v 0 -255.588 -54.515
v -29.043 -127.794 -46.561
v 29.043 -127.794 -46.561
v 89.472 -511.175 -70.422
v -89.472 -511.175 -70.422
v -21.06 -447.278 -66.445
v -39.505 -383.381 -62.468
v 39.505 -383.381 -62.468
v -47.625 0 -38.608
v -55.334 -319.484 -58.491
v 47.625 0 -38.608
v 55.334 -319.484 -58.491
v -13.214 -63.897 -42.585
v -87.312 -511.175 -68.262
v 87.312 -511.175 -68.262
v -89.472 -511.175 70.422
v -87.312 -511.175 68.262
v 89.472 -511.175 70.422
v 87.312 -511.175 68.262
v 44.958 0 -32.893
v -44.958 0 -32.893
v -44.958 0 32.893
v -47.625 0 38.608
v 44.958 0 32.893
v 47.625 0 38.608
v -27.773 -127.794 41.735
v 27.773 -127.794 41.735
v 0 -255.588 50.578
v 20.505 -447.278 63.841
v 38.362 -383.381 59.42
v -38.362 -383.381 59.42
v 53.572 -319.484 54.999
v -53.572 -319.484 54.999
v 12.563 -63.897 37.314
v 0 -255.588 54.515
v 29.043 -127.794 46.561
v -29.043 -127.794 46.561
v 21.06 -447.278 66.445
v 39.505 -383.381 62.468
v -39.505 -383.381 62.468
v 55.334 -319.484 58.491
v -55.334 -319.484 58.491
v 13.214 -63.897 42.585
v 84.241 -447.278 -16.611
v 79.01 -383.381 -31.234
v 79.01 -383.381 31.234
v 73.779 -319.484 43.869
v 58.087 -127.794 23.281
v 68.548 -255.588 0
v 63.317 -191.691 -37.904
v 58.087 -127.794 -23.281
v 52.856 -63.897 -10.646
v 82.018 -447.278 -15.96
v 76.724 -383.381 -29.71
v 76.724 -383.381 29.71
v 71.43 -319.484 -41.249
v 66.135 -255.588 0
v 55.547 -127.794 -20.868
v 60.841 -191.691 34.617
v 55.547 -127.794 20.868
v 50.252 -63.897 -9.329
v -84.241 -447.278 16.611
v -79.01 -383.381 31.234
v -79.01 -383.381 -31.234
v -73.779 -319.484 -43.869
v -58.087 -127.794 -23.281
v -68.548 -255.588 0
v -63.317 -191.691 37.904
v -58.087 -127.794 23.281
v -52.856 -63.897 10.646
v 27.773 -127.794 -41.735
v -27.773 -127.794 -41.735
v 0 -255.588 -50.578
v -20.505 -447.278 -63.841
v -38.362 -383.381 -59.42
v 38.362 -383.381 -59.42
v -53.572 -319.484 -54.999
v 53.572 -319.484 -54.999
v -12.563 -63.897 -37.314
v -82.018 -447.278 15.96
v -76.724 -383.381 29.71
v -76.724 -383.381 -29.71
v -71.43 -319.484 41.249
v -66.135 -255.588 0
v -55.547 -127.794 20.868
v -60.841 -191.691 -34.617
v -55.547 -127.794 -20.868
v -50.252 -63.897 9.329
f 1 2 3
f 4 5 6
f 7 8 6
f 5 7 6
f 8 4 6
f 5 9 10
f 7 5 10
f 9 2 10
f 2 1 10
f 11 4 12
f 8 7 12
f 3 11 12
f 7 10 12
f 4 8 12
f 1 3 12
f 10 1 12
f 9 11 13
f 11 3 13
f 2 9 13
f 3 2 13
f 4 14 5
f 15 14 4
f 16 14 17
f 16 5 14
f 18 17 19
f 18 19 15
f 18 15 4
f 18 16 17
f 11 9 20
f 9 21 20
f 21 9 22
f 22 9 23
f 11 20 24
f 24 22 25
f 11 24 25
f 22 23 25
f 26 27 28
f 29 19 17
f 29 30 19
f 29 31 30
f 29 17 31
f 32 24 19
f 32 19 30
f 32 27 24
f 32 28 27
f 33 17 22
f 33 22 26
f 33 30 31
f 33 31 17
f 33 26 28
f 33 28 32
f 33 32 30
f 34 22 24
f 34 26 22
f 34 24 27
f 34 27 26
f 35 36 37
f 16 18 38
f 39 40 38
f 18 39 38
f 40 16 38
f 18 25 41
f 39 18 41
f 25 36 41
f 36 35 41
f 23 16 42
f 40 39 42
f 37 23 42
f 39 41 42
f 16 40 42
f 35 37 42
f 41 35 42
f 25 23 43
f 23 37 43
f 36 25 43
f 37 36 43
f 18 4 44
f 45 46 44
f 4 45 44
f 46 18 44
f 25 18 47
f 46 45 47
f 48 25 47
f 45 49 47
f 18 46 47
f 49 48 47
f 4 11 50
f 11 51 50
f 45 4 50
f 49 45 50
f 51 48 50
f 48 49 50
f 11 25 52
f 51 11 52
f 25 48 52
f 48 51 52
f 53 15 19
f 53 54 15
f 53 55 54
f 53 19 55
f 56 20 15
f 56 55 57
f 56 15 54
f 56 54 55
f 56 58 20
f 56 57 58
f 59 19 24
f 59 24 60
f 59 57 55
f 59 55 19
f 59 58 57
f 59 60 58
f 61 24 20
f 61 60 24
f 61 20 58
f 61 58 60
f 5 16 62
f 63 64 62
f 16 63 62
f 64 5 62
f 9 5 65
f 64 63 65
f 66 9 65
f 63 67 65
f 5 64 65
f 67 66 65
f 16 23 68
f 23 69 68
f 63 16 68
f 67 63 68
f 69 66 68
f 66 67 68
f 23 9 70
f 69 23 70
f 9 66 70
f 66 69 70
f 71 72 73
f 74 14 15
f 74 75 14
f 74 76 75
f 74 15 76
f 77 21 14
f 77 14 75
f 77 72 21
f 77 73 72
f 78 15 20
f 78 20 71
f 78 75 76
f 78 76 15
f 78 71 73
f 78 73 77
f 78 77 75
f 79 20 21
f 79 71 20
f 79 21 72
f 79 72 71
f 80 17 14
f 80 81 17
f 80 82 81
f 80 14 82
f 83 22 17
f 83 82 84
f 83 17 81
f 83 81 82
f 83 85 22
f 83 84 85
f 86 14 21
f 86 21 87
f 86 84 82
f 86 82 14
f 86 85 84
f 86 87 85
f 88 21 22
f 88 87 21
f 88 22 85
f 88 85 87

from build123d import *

# Parameters (mm, degrees)
F0_W = 89.916
F0_H = 65.786
F2_W = 174.625
F2_H = 136.525
F5_W = 178.943
F5_H = 140.843
F4_W = 95.25
F4_H = 77.216


with BuildPart() as f3:
    # F0 (on Front) → F3 section 0
    with BuildSketch(Plane.XZ):
        Rectangle(F0_W, F0_H)
    # F2 (on offset) → F3 section 1
    with BuildSketch(Plane.XZ.offset(511.175)):
        Rectangle(F2_W, F2_H)
    loft()

    # F5 (on offset) → F6 section 0
    with BuildSketch(Plane.XZ.offset(511.175)):
        Rectangle(F5_W, F5_H)
    # F4 (on Front) → F6 section 1
    with BuildSketch(Plane.XZ):
        Rectangle(F4_W, F4_H)
    loft()

    # F2 (on offset) → F7 section 0
    with BuildSketch(Plane.XZ.offset(511.175)):
        Rectangle(F2_W, F2_H)
    # F0 (on Front) → F7 section 1
    with BuildSketch(Plane.XZ):
        Rectangle(F0_W, F0_H)
    loft(mode=Mode.SUBTRACT)


solid = f3.part
